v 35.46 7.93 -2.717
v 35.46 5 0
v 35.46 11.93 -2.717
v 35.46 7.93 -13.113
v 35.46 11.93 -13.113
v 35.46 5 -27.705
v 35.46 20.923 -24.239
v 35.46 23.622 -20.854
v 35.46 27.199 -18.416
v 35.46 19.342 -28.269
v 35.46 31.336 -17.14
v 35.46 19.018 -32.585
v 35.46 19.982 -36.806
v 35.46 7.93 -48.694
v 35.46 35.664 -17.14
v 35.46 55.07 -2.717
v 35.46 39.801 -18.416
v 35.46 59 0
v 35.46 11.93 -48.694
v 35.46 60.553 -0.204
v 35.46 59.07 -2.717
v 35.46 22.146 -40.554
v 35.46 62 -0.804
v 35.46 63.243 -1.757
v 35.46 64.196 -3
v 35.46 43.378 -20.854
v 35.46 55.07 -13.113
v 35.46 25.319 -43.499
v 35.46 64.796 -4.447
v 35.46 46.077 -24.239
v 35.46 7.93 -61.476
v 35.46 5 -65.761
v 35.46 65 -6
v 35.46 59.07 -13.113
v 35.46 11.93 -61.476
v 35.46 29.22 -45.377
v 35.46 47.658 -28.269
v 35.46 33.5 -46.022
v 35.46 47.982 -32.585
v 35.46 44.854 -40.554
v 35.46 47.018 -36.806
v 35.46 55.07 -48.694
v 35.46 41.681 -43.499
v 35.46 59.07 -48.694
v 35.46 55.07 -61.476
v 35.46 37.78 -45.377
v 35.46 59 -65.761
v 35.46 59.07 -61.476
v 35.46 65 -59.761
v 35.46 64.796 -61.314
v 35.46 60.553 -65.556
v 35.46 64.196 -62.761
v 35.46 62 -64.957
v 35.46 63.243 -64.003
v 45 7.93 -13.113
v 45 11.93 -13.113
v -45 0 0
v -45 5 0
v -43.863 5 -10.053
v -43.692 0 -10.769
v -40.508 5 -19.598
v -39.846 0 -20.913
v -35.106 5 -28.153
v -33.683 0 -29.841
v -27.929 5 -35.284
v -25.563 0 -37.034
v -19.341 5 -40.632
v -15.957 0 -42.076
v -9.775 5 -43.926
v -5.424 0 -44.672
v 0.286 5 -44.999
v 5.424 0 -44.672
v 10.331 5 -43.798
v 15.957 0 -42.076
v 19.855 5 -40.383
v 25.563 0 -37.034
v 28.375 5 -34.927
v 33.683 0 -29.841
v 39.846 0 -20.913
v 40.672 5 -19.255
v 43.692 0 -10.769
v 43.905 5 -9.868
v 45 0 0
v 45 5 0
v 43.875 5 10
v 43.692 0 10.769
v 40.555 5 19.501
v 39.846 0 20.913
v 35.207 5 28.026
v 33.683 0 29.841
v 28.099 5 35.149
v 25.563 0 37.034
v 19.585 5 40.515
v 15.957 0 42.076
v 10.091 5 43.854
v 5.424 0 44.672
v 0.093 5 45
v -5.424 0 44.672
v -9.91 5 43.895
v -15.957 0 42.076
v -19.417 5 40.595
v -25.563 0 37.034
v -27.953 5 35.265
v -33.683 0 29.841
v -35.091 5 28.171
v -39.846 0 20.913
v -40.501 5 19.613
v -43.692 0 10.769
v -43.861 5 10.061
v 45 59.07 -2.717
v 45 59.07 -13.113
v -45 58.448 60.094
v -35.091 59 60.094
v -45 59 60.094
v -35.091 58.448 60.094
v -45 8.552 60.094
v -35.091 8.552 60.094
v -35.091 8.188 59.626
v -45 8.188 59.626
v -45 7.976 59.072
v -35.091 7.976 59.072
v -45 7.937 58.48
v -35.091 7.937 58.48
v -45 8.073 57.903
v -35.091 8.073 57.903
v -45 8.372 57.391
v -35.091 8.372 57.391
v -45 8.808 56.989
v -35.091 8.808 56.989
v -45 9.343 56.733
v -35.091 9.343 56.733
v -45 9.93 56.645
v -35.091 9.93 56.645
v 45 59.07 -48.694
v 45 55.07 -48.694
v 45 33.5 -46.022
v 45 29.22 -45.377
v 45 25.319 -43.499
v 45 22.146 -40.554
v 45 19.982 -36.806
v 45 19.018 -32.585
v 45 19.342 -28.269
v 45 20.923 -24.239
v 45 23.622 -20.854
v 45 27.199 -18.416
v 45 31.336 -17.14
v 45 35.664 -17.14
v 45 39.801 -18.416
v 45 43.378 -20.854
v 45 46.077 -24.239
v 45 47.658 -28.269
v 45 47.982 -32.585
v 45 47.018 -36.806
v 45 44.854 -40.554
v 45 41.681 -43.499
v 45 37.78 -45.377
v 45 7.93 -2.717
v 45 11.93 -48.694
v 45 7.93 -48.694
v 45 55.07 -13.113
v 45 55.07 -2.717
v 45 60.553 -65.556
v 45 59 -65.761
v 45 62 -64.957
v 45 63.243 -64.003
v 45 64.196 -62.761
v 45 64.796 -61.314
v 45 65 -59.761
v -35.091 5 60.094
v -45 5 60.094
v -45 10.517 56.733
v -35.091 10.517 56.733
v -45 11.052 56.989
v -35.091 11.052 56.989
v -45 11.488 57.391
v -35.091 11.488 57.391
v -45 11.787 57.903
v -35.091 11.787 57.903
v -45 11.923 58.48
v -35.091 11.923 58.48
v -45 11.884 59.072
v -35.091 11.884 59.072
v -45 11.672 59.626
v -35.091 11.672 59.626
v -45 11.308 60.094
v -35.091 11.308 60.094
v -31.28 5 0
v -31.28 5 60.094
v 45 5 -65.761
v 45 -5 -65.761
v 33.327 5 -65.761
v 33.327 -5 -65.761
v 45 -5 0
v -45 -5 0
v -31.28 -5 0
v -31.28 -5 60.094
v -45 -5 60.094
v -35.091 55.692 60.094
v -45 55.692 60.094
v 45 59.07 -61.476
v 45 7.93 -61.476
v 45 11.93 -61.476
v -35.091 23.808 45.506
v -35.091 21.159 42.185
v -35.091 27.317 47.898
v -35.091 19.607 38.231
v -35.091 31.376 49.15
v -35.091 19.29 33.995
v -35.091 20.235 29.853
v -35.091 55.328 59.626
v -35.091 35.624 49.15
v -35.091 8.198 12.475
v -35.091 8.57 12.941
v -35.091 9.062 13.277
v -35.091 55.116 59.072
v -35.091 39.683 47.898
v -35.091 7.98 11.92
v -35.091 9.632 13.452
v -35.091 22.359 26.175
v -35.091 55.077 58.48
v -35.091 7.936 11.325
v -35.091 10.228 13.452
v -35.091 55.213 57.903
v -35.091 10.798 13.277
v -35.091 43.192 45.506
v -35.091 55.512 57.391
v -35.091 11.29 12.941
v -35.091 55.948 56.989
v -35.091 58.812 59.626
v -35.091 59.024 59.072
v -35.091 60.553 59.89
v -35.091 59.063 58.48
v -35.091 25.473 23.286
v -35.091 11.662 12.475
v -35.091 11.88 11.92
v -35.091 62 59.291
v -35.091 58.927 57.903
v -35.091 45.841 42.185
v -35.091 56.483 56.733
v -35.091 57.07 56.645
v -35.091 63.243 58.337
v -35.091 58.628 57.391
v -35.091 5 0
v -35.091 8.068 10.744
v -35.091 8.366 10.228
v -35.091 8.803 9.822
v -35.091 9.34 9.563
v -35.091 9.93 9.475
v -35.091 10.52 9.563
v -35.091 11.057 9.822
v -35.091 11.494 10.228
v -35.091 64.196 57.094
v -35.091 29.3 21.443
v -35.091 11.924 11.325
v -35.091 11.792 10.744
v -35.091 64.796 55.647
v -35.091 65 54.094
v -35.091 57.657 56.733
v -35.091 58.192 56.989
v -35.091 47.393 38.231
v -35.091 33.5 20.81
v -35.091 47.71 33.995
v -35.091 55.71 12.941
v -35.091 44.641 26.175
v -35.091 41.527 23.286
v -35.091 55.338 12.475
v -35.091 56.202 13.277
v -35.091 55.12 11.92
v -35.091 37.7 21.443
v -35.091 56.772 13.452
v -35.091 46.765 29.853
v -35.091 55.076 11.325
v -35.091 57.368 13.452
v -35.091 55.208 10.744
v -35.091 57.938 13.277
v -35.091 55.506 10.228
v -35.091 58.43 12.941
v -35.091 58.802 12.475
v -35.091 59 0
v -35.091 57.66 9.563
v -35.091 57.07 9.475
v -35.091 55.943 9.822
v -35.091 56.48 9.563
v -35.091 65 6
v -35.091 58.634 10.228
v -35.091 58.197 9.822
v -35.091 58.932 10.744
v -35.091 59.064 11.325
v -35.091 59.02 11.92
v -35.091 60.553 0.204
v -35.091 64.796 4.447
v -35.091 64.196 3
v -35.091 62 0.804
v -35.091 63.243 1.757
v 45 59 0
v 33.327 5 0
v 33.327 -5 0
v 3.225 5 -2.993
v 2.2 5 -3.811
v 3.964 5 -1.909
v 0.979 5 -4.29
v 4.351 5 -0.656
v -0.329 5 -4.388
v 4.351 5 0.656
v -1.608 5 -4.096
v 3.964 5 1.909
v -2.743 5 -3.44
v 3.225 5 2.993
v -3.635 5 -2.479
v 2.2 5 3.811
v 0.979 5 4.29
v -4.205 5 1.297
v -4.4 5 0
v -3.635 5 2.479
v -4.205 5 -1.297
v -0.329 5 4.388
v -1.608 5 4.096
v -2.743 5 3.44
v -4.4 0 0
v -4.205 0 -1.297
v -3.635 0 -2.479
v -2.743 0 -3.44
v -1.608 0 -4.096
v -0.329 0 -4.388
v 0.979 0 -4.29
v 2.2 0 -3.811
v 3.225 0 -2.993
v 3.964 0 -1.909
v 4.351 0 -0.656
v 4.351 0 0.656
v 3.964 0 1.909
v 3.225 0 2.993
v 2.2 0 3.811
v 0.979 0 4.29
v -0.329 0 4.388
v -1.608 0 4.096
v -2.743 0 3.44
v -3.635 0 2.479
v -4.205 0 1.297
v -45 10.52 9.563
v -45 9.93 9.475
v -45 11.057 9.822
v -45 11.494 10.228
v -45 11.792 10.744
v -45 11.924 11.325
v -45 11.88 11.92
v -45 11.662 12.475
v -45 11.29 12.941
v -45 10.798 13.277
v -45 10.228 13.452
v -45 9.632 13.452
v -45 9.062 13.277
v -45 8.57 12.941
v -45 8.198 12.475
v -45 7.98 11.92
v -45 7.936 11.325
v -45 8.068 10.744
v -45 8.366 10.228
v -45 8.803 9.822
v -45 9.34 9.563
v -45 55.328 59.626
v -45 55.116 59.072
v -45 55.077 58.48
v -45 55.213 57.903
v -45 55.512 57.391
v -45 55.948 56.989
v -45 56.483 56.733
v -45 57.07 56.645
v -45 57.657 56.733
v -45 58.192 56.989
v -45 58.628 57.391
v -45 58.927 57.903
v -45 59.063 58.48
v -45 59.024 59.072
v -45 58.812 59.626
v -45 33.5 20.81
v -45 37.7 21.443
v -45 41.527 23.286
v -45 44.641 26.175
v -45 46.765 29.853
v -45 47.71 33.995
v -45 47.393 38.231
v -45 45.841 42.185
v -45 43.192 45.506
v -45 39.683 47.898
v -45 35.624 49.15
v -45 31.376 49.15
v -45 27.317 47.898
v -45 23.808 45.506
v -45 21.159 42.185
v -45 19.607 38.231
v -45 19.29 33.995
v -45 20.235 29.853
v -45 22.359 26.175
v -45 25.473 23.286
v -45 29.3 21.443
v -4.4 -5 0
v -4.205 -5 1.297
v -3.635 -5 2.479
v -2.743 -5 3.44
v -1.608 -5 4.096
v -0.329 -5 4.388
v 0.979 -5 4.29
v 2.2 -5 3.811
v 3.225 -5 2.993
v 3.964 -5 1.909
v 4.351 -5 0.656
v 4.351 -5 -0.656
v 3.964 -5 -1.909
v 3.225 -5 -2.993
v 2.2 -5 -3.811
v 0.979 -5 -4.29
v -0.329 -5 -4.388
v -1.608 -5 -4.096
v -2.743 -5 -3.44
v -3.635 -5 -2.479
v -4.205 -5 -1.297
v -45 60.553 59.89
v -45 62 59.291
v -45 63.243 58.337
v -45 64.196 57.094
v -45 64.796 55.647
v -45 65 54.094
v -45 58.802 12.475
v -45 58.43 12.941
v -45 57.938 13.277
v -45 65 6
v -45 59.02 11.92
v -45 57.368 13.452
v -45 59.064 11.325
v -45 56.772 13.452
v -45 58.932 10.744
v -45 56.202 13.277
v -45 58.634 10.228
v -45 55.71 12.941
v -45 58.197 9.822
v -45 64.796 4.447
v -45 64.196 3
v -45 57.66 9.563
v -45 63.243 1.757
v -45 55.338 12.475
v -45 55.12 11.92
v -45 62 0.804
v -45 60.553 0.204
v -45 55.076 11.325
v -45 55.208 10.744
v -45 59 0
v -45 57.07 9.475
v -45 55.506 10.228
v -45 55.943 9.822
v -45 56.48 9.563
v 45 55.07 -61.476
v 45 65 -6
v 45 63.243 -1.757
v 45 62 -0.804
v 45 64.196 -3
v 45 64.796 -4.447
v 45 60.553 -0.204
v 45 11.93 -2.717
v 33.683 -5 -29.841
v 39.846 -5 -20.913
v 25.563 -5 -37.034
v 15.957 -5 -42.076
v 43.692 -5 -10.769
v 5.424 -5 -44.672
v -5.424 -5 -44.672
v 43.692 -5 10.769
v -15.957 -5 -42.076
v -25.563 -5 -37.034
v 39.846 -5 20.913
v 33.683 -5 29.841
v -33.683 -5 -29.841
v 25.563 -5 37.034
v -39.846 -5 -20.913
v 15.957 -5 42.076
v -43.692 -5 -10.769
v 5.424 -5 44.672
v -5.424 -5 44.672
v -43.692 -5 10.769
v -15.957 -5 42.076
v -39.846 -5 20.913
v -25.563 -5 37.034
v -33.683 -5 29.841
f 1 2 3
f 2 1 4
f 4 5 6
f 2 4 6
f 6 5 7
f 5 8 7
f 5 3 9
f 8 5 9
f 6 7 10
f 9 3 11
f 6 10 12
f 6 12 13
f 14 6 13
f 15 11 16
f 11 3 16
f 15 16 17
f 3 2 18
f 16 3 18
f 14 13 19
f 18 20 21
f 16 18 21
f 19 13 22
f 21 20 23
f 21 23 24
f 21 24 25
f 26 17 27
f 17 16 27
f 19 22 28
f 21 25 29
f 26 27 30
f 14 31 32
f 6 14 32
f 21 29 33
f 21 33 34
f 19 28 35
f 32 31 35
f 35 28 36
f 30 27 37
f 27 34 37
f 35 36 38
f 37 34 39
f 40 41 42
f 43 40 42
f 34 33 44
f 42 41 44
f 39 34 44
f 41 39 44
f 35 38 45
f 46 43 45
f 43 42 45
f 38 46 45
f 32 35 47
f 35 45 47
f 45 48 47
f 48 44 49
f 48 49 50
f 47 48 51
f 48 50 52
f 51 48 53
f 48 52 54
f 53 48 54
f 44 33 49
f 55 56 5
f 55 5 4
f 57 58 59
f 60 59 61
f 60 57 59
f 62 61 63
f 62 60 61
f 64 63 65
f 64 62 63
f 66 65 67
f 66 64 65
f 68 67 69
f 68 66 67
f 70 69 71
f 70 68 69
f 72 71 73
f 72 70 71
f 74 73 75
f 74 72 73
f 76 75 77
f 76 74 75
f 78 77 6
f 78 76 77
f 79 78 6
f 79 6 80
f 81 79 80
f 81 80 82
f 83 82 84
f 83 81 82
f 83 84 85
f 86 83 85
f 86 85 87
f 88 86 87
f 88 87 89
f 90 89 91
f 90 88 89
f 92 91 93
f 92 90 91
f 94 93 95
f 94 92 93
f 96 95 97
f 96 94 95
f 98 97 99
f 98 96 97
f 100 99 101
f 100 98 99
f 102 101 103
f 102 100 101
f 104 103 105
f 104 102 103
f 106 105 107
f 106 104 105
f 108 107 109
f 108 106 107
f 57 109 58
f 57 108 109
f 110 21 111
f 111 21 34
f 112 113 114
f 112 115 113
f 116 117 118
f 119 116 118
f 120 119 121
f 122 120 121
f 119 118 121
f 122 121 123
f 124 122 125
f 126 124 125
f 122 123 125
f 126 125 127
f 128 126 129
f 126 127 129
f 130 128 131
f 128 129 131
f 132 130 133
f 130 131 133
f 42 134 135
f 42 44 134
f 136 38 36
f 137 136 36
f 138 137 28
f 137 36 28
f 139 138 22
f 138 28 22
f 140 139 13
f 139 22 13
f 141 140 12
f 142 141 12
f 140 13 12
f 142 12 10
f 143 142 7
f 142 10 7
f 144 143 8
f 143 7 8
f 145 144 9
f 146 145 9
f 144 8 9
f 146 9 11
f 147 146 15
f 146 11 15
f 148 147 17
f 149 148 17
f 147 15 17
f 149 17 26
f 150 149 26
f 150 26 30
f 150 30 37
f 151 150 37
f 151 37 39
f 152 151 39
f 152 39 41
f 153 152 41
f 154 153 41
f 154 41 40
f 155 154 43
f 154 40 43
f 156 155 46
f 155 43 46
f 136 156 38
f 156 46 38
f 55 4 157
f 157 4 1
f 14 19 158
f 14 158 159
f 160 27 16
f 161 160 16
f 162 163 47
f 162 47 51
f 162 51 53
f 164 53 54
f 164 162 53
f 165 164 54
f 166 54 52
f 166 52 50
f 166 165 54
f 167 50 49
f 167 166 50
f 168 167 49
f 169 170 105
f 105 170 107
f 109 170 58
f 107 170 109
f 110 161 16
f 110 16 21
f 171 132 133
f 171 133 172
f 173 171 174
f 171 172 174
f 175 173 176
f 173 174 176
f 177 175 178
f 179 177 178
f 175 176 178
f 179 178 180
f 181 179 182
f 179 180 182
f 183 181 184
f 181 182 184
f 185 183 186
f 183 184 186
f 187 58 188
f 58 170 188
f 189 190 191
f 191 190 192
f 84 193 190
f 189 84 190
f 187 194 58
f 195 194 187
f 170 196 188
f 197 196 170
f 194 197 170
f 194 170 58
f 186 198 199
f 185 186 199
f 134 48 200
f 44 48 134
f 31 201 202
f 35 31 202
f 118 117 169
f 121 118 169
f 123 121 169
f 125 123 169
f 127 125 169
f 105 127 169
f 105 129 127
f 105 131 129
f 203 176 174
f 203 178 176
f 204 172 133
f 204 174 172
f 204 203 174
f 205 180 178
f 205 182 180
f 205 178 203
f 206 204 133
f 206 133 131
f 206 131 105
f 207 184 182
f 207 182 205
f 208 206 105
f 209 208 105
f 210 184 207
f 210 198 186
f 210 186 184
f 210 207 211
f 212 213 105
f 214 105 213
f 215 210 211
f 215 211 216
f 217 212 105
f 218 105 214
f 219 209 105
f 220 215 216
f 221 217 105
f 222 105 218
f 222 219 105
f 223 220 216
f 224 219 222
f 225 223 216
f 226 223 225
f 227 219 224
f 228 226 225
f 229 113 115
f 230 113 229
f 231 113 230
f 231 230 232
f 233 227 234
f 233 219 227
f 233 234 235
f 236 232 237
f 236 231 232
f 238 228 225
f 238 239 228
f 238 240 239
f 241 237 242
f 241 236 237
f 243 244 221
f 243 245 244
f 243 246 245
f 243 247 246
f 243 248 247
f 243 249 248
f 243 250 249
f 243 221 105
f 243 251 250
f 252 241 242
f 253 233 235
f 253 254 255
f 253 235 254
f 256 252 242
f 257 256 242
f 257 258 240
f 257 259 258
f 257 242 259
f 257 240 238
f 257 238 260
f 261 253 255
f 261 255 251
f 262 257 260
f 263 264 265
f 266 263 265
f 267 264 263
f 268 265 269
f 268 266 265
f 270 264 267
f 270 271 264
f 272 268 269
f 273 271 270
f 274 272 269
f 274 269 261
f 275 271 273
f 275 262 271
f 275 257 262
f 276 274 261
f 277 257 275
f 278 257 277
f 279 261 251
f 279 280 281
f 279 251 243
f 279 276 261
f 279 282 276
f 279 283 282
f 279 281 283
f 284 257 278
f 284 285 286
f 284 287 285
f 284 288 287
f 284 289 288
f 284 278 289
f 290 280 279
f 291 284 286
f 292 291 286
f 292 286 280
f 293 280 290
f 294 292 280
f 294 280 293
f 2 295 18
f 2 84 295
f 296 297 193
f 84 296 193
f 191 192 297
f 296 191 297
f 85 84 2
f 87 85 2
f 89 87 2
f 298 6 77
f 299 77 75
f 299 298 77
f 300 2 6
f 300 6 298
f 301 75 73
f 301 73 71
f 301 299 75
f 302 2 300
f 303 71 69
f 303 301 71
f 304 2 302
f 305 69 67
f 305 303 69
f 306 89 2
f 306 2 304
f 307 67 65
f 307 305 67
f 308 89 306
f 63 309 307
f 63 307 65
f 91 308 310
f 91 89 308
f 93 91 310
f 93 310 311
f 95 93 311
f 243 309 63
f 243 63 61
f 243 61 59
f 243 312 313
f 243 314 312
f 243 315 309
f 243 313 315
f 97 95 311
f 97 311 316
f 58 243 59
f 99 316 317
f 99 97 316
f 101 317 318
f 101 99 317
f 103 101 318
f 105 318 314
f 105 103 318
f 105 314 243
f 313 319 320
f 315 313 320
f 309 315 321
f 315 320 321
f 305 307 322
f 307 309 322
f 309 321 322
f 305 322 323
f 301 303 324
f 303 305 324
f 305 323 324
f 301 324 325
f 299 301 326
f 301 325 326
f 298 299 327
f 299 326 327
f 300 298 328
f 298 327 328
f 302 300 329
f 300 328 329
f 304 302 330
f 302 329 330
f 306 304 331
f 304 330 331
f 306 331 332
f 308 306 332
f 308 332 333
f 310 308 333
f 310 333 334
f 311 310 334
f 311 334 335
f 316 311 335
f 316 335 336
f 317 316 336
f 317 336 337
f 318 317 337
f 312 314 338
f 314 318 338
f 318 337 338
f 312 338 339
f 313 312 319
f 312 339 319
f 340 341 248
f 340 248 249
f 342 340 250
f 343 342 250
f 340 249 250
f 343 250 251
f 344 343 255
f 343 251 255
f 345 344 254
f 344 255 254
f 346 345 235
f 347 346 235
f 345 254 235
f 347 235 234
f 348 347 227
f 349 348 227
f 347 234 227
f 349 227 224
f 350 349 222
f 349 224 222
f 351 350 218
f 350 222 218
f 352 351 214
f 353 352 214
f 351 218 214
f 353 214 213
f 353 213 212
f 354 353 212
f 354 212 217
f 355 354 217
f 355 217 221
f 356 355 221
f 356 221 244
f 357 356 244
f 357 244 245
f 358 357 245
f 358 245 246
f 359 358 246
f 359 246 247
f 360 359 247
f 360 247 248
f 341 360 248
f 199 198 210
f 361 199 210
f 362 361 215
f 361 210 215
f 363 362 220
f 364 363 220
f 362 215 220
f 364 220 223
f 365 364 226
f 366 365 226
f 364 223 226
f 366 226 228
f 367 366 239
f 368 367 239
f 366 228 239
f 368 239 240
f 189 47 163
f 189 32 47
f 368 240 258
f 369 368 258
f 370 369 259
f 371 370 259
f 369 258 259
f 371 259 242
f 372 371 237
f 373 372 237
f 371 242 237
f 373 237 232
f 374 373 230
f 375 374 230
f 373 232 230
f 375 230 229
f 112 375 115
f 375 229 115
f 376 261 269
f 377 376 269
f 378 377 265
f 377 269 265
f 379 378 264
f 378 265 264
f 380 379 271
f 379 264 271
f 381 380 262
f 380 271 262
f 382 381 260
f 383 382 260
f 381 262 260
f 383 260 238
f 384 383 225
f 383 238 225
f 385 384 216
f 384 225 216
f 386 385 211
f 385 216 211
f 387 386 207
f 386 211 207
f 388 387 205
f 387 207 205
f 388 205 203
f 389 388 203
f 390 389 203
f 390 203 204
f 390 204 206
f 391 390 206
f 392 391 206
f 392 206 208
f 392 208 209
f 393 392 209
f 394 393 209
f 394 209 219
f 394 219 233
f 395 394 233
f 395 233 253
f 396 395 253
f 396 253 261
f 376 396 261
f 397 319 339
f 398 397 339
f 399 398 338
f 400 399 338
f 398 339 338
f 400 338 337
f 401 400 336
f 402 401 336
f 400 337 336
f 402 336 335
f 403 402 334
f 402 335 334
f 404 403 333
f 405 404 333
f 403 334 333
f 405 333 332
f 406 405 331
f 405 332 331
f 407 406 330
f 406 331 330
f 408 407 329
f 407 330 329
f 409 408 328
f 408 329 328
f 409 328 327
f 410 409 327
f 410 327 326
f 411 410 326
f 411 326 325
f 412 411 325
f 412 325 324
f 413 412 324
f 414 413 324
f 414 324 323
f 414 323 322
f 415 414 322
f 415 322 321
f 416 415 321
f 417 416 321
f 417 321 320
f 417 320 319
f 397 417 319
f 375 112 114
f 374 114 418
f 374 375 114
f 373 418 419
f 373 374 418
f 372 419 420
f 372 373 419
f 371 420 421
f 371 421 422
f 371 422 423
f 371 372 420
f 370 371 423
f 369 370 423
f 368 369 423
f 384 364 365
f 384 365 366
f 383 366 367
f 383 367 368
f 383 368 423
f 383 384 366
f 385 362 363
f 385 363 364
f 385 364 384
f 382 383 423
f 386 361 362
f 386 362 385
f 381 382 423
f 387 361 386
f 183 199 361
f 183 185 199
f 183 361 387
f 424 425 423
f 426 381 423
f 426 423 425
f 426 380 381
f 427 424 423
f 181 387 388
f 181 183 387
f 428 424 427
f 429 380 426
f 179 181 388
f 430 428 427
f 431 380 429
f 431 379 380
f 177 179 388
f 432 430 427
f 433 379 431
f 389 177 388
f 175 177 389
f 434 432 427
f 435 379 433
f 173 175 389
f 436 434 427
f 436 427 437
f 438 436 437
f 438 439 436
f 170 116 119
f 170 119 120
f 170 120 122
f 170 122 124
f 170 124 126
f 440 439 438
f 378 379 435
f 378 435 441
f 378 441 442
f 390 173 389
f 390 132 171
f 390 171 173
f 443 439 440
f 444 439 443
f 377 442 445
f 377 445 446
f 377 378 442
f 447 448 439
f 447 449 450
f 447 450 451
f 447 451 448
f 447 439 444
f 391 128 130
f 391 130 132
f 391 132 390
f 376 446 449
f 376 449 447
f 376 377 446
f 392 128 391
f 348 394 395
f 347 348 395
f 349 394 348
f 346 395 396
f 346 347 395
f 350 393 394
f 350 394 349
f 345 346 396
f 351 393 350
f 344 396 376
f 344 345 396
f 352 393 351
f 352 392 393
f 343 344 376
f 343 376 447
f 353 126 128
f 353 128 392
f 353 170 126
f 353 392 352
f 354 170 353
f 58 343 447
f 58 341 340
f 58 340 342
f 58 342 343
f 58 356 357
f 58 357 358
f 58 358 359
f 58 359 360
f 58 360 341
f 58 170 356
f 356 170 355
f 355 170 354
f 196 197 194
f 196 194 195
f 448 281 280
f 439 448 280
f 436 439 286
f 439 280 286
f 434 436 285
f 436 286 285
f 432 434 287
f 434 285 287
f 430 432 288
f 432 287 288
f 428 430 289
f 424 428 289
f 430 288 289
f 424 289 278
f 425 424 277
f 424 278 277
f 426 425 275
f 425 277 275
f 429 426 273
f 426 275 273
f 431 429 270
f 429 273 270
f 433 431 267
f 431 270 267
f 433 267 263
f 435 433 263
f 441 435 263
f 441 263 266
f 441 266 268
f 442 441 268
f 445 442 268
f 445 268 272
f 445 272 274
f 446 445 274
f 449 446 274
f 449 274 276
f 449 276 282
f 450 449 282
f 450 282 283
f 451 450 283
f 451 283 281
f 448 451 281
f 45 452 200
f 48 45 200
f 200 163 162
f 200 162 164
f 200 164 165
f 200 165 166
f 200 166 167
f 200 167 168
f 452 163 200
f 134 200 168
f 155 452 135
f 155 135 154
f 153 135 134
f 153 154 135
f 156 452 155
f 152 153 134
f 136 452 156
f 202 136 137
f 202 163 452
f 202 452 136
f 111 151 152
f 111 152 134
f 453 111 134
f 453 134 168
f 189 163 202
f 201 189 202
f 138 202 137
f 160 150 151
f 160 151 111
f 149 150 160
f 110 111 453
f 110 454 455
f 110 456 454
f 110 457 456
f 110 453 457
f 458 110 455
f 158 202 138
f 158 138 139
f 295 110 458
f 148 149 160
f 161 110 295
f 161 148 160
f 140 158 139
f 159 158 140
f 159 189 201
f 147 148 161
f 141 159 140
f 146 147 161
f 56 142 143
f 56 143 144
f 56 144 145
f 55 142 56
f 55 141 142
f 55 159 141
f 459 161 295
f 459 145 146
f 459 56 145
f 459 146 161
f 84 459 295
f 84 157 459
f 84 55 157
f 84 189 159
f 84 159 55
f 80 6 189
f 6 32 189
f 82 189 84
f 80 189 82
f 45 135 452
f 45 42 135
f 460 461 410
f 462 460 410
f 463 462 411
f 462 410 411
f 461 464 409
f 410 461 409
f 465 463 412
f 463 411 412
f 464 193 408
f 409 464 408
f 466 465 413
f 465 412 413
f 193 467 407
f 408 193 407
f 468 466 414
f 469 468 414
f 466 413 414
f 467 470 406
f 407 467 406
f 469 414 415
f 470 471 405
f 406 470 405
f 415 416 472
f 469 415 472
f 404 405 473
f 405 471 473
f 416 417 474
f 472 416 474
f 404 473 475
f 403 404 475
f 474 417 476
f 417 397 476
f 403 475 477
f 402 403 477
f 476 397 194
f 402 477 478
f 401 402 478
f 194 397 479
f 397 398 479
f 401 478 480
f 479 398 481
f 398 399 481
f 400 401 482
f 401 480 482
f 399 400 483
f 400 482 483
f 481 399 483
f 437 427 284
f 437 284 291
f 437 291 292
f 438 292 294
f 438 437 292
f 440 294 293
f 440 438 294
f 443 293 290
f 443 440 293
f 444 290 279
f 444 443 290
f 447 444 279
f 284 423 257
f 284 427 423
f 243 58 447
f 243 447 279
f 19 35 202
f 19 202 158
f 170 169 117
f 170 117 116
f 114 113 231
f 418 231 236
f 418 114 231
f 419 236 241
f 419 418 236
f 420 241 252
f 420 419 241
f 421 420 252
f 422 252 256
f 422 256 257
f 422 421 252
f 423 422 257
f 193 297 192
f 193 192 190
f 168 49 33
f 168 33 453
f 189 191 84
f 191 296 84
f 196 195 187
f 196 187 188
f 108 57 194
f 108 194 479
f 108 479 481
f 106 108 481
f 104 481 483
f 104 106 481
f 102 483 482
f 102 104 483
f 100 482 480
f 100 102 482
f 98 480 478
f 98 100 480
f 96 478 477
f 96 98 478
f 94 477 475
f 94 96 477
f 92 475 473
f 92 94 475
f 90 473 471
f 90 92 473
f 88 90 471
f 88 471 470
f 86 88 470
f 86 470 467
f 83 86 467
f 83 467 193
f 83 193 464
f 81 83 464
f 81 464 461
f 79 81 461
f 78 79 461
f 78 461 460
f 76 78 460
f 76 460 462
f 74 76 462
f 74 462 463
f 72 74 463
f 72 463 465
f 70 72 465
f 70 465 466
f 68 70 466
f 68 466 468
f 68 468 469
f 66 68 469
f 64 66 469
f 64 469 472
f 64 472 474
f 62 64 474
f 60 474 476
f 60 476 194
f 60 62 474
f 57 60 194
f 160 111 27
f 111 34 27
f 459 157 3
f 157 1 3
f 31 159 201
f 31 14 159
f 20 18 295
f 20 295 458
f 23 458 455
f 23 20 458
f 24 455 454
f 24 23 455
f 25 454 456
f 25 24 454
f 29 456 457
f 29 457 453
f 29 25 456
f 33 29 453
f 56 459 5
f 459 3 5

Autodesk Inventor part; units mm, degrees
ref_plane "YZ Plane" through (0, 0, 0) normal (1, 0, 0) x (0, 1, 0)
ref_plane "XZ Plane" through (0, 0, 0) normal (0, 1, 0) x (-1, 0, 0)
ref_plane "XY Plane" through (0, 0, 0) normal (0, 0, 1) x (1, 0, 0)
sketch "Sketch1" plane through (0, 0, 0) normal (0, 1, 0) x (-1, 0, 0)
  circle A0 centre (0, 0) radius 4.4
  circle A1 centre (0, 0) radius 45
  dimension "d0" = 8.8
  dimension "d1" = 90
extrude "Extrusion1" add sketch "Sketch1" along normal mid plane 10
sketch "Sketch2" plane through (0, 5, 0) normal (0, 1, 0) x (1, 0, 0)
  circle A0 centre (0, 0) radius 45 projected
  line L0 (-45, 0) -> (-53, 0)
  line L1 (-53, 0) -> (-53, 49.2006)
  line L2 (45, 0) -> (53, 0)
  line L3 (53, 0) -> (53, 50.9351)
  line L4 (53, 50.9351) -> (45, 50.9351)
  line L5 (45, 50.9351) -> (45, -52.3215)
  line L6 (45, -52.3215) -> (53, -52.3215)
  line L7 (53, -52.3215) -> (53, 50.9351)
  line L8 (-53, 50.9351) -> (-45, 50.9351)
  line L9 (-45, 50.9351) -> (-45, -59.1596)
  line L10 (-45, -59.1596) -> (-53, -59.1596)
  line L11 (-53, -59.1596) -> (-53, 50.9351)
  line L12 (-45, 0) -> (-31.2804, 0)
  line L13 (-31.2804, 0) -> (-31.2804, -60.0944)
  line L14 (-31.2804, -60.0944) -> (-45, -60.0944)
  line L15 (-45, -60.0944) -> (-45, 0)
  line L16 (45, 0) -> (33.3273, 0)
  line L17 (33.3273, 0) -> (33.3273, 65.7607)
  line L18 (33.3273, 65.7607) -> (45, 65.7607)
  line L19 (45, 65.7607) -> (45, 0)
  line L20 (-31.2804, 0) -> (-43.8048, 0)
  line L21 (-43.8048, 0) -> (-43.8048, -65.7457)
  line L22 (-43.8048, -65.7457) -> (-31.2804, -65.7457)
  line L23 (-31.2804, -65.7457) -> (-31.2804, 0)
  dimension "d4" = 8
  dimension "d5" = 8
extrude "Extrusion2" add sketch "Sketch2" along normal blind 60 contours L16 L17 A0 | A0 L17 L18 L19 L5 | L13 L14 L21 A0 | A0 L21 L12 L13 | L12 L21 A0 | A0 L21 L14 L15 L9
sketch "Sketch3" plane through (0, 5, 0) normal (0, 1, 0) x (1, 0, 0)
  point P0 (0, 0)
sketch "Sketch4" plane through (-31.2804, 5, 60.0944) normal (1, 0, 0) x (0, 0, -1)
  line L0 (0, 0) -> (27.7442, 0) projected
  line L1 (0, 0) -> (0, 57)
  line L2 (0, 0) -> (0, 60) projected
  line L3 (60.0944, 0) -> (60.0944, 60) projected
  line L4 (60.0944, 0) -> (15.0944, 0) projected
  circle A0 centre (25.0348, 28.5) radius 14.25
  line L5 (1.4498, 4.93) -> (48.6198, 4.93)
  line L6 (1.4498, 4.93) -> (48.6198, 52.07) construction
  line L7 (48.6198, 4.93) -> (1.4498, 52.07) construction
  circle A1 centre (48.6198, 52.07) radius 2
  circle A2 centre (48.6198, 4.93) radius 2
  circle A3 centre (1.4498, 4.93) radius 2
  circle A4 centre (1.4498, 52.07) radius 2
  circle A5 centre (91.5944, 28.5) radius 14.5222
  line L8 (68.0094, 4.93) -> (115.1794, 52.07) construction
  line L9 (115.1794, 4.93) -> (68.0094, 52.07) construction
  line L10 (62.8112, 54.07) -> (73.2076, 54.07)
  line L11 (73.2076, 54.07) -> (73.2076, 50.07)
  line L12 (73.2076, 50.07) -> (62.8112, 50.07)
  line L13 (62.8112, 50.07) -> (62.8112, 54.07)
  line L14 (62.8112, 54.07) -> (73.2076, 50.07) construction
  line L15 (73.2076, 54.07) -> (62.8112, 50.07) construction
  line L16 (62.8112, 6.93) -> (73.2076, 6.93)
  line L17 (73.2076, 6.93) -> (73.2076, 2.93)
  line L18 (73.2076, 2.93) -> (62.8112, 2.93)
  line L19 (62.8112, 2.93) -> (62.8112, 6.93)
  line L20 (66.1428, 5.6482) -> (73.2076, 2.93) construction
  line L21 (73.2076, 6.93) -> (62.8112, 2.93) construction
  line L22 (121.5703, 54.07) -> (108.7885, 54.07)
  line L23 (108.7885, 54.07) -> (108.7885, 50.07)
  line L24 (108.7885, 50.07) -> (121.5703, 50.07)
  line L25 (121.5703, 50.07) -> (121.5703, 54.07)
  line L26 (121.5703, 54.07) -> (108.7885, 50.07) construction
  line L27 (108.7885, 54.07) -> (121.5703, 50.07) construction
  line L28 (121.5703, 6.93) -> (108.7885, 6.93)
  line L29 (108.7885, 6.93) -> (108.7885, 2.93)
  line L30 (108.7885, 2.93) -> (121.5703, 2.93)
  line L31 (121.5703, 2.93) -> (121.5703, 6.93)
  line L32 (121.5703, 6.93) -> (108.7885, 2.93) construction
  line L33 (108.7885, 6.93) -> (121.5703, 2.93) construction
  point P0 (60.0944, -5)
  dimension "d8" = 57
  dimension "d13" = 4
  dimension "d14" = 4
extrude "Extrusion3" cut sketch "Sketch4" along normal mid plane 660
sketch "Sketch5" plane through (33.3273, 5, -65.7607) normal (-1, 0, 0) x (0, 0, 1)
  point P0 (65.7607, -5)
sketch "Sketch6" plane through (0, -5, 0) normal (0, -1, 0) x (1, 0, 0)
  line L0 (45, 0) -> (45, -65.7607) projected
  line L1 (33.3273, 0) -> (45, 0) projected
  line L2 (45, -65.7607) -> (33.3273, -65.7607)
  line L3 (33.3273, -65.7607) -> (33.3273, 0)
  line L4 (33.3273, 0) -> (45, 0)
  line L5 (45, 0) -> (45, -65.7607)
  circle A0 centre (0, 0) radius 45 projected
  line L6 (-31.2804, 60.0944) -> (-45, 60.0944) projected
  line L7 (-45, 0) -> (-31.2804, 0)
  line L8 (-31.2804, 0) -> (-31.2804, 60.0944)
  line L9 (-31.2804, 60.0944) -> (-45, 60.0944)
  line L10 (-45, 60.0944) -> (-45, 0)
extrude "Extrusion4" add sketch "Sketch6" against normal blind 10 separate body contours A0 L3 L1 | L0 L2 L3 A0 | L8 L7 A0 | A0 L10 L6 L8
fillet "Fillet1" radius 6 4 edges at (-38.1402, 65, 0) (-38.1402, 65, 60.0944) (39.1636, 65, 0) (39.1636, 65, -65.7607)
sketch "Sketch7" plane through (0, 65, 0) normal (0, 1, 0) x (1, 0, 0)
  line L0 (-31.2804, 0) -> (-45, 0) projected
  line L1 (-31.2804, -60.0944) -> (-31.2804, -32.3502) projected
  line L2 (-35.091, 0) -> (-31.2804, 0)
  line L3 (-31.2804, 0) -> (-31.2804, -60.0944)
  line L4 (-31.2804, -60.0944) -> (-35.091, -60.0944)
  line L5 (-35.091, -60.0944) -> (-35.091, 0)
  line L6 (45, 0) -> (33.3273, 0) projected
  line L7 (45, 65.7607) -> (33.3273, 65.7607) projected
  line L8 (33.3273, 0) -> (35.4604, 0)
  line L9 (35.4604, 0) -> (35.4604, 65.7607)
  line L10 (35.4604, 65.7607) -> (33.3273, 65.7607)
  line L11 (33.3273, 65.7607) -> (33.3273, 0)
  point P0 (0, 0)
extrude "Extrusion5" cut sketch "Sketch7" against normal blind 60 bodies 1 2
properties part number "forearm_base"
